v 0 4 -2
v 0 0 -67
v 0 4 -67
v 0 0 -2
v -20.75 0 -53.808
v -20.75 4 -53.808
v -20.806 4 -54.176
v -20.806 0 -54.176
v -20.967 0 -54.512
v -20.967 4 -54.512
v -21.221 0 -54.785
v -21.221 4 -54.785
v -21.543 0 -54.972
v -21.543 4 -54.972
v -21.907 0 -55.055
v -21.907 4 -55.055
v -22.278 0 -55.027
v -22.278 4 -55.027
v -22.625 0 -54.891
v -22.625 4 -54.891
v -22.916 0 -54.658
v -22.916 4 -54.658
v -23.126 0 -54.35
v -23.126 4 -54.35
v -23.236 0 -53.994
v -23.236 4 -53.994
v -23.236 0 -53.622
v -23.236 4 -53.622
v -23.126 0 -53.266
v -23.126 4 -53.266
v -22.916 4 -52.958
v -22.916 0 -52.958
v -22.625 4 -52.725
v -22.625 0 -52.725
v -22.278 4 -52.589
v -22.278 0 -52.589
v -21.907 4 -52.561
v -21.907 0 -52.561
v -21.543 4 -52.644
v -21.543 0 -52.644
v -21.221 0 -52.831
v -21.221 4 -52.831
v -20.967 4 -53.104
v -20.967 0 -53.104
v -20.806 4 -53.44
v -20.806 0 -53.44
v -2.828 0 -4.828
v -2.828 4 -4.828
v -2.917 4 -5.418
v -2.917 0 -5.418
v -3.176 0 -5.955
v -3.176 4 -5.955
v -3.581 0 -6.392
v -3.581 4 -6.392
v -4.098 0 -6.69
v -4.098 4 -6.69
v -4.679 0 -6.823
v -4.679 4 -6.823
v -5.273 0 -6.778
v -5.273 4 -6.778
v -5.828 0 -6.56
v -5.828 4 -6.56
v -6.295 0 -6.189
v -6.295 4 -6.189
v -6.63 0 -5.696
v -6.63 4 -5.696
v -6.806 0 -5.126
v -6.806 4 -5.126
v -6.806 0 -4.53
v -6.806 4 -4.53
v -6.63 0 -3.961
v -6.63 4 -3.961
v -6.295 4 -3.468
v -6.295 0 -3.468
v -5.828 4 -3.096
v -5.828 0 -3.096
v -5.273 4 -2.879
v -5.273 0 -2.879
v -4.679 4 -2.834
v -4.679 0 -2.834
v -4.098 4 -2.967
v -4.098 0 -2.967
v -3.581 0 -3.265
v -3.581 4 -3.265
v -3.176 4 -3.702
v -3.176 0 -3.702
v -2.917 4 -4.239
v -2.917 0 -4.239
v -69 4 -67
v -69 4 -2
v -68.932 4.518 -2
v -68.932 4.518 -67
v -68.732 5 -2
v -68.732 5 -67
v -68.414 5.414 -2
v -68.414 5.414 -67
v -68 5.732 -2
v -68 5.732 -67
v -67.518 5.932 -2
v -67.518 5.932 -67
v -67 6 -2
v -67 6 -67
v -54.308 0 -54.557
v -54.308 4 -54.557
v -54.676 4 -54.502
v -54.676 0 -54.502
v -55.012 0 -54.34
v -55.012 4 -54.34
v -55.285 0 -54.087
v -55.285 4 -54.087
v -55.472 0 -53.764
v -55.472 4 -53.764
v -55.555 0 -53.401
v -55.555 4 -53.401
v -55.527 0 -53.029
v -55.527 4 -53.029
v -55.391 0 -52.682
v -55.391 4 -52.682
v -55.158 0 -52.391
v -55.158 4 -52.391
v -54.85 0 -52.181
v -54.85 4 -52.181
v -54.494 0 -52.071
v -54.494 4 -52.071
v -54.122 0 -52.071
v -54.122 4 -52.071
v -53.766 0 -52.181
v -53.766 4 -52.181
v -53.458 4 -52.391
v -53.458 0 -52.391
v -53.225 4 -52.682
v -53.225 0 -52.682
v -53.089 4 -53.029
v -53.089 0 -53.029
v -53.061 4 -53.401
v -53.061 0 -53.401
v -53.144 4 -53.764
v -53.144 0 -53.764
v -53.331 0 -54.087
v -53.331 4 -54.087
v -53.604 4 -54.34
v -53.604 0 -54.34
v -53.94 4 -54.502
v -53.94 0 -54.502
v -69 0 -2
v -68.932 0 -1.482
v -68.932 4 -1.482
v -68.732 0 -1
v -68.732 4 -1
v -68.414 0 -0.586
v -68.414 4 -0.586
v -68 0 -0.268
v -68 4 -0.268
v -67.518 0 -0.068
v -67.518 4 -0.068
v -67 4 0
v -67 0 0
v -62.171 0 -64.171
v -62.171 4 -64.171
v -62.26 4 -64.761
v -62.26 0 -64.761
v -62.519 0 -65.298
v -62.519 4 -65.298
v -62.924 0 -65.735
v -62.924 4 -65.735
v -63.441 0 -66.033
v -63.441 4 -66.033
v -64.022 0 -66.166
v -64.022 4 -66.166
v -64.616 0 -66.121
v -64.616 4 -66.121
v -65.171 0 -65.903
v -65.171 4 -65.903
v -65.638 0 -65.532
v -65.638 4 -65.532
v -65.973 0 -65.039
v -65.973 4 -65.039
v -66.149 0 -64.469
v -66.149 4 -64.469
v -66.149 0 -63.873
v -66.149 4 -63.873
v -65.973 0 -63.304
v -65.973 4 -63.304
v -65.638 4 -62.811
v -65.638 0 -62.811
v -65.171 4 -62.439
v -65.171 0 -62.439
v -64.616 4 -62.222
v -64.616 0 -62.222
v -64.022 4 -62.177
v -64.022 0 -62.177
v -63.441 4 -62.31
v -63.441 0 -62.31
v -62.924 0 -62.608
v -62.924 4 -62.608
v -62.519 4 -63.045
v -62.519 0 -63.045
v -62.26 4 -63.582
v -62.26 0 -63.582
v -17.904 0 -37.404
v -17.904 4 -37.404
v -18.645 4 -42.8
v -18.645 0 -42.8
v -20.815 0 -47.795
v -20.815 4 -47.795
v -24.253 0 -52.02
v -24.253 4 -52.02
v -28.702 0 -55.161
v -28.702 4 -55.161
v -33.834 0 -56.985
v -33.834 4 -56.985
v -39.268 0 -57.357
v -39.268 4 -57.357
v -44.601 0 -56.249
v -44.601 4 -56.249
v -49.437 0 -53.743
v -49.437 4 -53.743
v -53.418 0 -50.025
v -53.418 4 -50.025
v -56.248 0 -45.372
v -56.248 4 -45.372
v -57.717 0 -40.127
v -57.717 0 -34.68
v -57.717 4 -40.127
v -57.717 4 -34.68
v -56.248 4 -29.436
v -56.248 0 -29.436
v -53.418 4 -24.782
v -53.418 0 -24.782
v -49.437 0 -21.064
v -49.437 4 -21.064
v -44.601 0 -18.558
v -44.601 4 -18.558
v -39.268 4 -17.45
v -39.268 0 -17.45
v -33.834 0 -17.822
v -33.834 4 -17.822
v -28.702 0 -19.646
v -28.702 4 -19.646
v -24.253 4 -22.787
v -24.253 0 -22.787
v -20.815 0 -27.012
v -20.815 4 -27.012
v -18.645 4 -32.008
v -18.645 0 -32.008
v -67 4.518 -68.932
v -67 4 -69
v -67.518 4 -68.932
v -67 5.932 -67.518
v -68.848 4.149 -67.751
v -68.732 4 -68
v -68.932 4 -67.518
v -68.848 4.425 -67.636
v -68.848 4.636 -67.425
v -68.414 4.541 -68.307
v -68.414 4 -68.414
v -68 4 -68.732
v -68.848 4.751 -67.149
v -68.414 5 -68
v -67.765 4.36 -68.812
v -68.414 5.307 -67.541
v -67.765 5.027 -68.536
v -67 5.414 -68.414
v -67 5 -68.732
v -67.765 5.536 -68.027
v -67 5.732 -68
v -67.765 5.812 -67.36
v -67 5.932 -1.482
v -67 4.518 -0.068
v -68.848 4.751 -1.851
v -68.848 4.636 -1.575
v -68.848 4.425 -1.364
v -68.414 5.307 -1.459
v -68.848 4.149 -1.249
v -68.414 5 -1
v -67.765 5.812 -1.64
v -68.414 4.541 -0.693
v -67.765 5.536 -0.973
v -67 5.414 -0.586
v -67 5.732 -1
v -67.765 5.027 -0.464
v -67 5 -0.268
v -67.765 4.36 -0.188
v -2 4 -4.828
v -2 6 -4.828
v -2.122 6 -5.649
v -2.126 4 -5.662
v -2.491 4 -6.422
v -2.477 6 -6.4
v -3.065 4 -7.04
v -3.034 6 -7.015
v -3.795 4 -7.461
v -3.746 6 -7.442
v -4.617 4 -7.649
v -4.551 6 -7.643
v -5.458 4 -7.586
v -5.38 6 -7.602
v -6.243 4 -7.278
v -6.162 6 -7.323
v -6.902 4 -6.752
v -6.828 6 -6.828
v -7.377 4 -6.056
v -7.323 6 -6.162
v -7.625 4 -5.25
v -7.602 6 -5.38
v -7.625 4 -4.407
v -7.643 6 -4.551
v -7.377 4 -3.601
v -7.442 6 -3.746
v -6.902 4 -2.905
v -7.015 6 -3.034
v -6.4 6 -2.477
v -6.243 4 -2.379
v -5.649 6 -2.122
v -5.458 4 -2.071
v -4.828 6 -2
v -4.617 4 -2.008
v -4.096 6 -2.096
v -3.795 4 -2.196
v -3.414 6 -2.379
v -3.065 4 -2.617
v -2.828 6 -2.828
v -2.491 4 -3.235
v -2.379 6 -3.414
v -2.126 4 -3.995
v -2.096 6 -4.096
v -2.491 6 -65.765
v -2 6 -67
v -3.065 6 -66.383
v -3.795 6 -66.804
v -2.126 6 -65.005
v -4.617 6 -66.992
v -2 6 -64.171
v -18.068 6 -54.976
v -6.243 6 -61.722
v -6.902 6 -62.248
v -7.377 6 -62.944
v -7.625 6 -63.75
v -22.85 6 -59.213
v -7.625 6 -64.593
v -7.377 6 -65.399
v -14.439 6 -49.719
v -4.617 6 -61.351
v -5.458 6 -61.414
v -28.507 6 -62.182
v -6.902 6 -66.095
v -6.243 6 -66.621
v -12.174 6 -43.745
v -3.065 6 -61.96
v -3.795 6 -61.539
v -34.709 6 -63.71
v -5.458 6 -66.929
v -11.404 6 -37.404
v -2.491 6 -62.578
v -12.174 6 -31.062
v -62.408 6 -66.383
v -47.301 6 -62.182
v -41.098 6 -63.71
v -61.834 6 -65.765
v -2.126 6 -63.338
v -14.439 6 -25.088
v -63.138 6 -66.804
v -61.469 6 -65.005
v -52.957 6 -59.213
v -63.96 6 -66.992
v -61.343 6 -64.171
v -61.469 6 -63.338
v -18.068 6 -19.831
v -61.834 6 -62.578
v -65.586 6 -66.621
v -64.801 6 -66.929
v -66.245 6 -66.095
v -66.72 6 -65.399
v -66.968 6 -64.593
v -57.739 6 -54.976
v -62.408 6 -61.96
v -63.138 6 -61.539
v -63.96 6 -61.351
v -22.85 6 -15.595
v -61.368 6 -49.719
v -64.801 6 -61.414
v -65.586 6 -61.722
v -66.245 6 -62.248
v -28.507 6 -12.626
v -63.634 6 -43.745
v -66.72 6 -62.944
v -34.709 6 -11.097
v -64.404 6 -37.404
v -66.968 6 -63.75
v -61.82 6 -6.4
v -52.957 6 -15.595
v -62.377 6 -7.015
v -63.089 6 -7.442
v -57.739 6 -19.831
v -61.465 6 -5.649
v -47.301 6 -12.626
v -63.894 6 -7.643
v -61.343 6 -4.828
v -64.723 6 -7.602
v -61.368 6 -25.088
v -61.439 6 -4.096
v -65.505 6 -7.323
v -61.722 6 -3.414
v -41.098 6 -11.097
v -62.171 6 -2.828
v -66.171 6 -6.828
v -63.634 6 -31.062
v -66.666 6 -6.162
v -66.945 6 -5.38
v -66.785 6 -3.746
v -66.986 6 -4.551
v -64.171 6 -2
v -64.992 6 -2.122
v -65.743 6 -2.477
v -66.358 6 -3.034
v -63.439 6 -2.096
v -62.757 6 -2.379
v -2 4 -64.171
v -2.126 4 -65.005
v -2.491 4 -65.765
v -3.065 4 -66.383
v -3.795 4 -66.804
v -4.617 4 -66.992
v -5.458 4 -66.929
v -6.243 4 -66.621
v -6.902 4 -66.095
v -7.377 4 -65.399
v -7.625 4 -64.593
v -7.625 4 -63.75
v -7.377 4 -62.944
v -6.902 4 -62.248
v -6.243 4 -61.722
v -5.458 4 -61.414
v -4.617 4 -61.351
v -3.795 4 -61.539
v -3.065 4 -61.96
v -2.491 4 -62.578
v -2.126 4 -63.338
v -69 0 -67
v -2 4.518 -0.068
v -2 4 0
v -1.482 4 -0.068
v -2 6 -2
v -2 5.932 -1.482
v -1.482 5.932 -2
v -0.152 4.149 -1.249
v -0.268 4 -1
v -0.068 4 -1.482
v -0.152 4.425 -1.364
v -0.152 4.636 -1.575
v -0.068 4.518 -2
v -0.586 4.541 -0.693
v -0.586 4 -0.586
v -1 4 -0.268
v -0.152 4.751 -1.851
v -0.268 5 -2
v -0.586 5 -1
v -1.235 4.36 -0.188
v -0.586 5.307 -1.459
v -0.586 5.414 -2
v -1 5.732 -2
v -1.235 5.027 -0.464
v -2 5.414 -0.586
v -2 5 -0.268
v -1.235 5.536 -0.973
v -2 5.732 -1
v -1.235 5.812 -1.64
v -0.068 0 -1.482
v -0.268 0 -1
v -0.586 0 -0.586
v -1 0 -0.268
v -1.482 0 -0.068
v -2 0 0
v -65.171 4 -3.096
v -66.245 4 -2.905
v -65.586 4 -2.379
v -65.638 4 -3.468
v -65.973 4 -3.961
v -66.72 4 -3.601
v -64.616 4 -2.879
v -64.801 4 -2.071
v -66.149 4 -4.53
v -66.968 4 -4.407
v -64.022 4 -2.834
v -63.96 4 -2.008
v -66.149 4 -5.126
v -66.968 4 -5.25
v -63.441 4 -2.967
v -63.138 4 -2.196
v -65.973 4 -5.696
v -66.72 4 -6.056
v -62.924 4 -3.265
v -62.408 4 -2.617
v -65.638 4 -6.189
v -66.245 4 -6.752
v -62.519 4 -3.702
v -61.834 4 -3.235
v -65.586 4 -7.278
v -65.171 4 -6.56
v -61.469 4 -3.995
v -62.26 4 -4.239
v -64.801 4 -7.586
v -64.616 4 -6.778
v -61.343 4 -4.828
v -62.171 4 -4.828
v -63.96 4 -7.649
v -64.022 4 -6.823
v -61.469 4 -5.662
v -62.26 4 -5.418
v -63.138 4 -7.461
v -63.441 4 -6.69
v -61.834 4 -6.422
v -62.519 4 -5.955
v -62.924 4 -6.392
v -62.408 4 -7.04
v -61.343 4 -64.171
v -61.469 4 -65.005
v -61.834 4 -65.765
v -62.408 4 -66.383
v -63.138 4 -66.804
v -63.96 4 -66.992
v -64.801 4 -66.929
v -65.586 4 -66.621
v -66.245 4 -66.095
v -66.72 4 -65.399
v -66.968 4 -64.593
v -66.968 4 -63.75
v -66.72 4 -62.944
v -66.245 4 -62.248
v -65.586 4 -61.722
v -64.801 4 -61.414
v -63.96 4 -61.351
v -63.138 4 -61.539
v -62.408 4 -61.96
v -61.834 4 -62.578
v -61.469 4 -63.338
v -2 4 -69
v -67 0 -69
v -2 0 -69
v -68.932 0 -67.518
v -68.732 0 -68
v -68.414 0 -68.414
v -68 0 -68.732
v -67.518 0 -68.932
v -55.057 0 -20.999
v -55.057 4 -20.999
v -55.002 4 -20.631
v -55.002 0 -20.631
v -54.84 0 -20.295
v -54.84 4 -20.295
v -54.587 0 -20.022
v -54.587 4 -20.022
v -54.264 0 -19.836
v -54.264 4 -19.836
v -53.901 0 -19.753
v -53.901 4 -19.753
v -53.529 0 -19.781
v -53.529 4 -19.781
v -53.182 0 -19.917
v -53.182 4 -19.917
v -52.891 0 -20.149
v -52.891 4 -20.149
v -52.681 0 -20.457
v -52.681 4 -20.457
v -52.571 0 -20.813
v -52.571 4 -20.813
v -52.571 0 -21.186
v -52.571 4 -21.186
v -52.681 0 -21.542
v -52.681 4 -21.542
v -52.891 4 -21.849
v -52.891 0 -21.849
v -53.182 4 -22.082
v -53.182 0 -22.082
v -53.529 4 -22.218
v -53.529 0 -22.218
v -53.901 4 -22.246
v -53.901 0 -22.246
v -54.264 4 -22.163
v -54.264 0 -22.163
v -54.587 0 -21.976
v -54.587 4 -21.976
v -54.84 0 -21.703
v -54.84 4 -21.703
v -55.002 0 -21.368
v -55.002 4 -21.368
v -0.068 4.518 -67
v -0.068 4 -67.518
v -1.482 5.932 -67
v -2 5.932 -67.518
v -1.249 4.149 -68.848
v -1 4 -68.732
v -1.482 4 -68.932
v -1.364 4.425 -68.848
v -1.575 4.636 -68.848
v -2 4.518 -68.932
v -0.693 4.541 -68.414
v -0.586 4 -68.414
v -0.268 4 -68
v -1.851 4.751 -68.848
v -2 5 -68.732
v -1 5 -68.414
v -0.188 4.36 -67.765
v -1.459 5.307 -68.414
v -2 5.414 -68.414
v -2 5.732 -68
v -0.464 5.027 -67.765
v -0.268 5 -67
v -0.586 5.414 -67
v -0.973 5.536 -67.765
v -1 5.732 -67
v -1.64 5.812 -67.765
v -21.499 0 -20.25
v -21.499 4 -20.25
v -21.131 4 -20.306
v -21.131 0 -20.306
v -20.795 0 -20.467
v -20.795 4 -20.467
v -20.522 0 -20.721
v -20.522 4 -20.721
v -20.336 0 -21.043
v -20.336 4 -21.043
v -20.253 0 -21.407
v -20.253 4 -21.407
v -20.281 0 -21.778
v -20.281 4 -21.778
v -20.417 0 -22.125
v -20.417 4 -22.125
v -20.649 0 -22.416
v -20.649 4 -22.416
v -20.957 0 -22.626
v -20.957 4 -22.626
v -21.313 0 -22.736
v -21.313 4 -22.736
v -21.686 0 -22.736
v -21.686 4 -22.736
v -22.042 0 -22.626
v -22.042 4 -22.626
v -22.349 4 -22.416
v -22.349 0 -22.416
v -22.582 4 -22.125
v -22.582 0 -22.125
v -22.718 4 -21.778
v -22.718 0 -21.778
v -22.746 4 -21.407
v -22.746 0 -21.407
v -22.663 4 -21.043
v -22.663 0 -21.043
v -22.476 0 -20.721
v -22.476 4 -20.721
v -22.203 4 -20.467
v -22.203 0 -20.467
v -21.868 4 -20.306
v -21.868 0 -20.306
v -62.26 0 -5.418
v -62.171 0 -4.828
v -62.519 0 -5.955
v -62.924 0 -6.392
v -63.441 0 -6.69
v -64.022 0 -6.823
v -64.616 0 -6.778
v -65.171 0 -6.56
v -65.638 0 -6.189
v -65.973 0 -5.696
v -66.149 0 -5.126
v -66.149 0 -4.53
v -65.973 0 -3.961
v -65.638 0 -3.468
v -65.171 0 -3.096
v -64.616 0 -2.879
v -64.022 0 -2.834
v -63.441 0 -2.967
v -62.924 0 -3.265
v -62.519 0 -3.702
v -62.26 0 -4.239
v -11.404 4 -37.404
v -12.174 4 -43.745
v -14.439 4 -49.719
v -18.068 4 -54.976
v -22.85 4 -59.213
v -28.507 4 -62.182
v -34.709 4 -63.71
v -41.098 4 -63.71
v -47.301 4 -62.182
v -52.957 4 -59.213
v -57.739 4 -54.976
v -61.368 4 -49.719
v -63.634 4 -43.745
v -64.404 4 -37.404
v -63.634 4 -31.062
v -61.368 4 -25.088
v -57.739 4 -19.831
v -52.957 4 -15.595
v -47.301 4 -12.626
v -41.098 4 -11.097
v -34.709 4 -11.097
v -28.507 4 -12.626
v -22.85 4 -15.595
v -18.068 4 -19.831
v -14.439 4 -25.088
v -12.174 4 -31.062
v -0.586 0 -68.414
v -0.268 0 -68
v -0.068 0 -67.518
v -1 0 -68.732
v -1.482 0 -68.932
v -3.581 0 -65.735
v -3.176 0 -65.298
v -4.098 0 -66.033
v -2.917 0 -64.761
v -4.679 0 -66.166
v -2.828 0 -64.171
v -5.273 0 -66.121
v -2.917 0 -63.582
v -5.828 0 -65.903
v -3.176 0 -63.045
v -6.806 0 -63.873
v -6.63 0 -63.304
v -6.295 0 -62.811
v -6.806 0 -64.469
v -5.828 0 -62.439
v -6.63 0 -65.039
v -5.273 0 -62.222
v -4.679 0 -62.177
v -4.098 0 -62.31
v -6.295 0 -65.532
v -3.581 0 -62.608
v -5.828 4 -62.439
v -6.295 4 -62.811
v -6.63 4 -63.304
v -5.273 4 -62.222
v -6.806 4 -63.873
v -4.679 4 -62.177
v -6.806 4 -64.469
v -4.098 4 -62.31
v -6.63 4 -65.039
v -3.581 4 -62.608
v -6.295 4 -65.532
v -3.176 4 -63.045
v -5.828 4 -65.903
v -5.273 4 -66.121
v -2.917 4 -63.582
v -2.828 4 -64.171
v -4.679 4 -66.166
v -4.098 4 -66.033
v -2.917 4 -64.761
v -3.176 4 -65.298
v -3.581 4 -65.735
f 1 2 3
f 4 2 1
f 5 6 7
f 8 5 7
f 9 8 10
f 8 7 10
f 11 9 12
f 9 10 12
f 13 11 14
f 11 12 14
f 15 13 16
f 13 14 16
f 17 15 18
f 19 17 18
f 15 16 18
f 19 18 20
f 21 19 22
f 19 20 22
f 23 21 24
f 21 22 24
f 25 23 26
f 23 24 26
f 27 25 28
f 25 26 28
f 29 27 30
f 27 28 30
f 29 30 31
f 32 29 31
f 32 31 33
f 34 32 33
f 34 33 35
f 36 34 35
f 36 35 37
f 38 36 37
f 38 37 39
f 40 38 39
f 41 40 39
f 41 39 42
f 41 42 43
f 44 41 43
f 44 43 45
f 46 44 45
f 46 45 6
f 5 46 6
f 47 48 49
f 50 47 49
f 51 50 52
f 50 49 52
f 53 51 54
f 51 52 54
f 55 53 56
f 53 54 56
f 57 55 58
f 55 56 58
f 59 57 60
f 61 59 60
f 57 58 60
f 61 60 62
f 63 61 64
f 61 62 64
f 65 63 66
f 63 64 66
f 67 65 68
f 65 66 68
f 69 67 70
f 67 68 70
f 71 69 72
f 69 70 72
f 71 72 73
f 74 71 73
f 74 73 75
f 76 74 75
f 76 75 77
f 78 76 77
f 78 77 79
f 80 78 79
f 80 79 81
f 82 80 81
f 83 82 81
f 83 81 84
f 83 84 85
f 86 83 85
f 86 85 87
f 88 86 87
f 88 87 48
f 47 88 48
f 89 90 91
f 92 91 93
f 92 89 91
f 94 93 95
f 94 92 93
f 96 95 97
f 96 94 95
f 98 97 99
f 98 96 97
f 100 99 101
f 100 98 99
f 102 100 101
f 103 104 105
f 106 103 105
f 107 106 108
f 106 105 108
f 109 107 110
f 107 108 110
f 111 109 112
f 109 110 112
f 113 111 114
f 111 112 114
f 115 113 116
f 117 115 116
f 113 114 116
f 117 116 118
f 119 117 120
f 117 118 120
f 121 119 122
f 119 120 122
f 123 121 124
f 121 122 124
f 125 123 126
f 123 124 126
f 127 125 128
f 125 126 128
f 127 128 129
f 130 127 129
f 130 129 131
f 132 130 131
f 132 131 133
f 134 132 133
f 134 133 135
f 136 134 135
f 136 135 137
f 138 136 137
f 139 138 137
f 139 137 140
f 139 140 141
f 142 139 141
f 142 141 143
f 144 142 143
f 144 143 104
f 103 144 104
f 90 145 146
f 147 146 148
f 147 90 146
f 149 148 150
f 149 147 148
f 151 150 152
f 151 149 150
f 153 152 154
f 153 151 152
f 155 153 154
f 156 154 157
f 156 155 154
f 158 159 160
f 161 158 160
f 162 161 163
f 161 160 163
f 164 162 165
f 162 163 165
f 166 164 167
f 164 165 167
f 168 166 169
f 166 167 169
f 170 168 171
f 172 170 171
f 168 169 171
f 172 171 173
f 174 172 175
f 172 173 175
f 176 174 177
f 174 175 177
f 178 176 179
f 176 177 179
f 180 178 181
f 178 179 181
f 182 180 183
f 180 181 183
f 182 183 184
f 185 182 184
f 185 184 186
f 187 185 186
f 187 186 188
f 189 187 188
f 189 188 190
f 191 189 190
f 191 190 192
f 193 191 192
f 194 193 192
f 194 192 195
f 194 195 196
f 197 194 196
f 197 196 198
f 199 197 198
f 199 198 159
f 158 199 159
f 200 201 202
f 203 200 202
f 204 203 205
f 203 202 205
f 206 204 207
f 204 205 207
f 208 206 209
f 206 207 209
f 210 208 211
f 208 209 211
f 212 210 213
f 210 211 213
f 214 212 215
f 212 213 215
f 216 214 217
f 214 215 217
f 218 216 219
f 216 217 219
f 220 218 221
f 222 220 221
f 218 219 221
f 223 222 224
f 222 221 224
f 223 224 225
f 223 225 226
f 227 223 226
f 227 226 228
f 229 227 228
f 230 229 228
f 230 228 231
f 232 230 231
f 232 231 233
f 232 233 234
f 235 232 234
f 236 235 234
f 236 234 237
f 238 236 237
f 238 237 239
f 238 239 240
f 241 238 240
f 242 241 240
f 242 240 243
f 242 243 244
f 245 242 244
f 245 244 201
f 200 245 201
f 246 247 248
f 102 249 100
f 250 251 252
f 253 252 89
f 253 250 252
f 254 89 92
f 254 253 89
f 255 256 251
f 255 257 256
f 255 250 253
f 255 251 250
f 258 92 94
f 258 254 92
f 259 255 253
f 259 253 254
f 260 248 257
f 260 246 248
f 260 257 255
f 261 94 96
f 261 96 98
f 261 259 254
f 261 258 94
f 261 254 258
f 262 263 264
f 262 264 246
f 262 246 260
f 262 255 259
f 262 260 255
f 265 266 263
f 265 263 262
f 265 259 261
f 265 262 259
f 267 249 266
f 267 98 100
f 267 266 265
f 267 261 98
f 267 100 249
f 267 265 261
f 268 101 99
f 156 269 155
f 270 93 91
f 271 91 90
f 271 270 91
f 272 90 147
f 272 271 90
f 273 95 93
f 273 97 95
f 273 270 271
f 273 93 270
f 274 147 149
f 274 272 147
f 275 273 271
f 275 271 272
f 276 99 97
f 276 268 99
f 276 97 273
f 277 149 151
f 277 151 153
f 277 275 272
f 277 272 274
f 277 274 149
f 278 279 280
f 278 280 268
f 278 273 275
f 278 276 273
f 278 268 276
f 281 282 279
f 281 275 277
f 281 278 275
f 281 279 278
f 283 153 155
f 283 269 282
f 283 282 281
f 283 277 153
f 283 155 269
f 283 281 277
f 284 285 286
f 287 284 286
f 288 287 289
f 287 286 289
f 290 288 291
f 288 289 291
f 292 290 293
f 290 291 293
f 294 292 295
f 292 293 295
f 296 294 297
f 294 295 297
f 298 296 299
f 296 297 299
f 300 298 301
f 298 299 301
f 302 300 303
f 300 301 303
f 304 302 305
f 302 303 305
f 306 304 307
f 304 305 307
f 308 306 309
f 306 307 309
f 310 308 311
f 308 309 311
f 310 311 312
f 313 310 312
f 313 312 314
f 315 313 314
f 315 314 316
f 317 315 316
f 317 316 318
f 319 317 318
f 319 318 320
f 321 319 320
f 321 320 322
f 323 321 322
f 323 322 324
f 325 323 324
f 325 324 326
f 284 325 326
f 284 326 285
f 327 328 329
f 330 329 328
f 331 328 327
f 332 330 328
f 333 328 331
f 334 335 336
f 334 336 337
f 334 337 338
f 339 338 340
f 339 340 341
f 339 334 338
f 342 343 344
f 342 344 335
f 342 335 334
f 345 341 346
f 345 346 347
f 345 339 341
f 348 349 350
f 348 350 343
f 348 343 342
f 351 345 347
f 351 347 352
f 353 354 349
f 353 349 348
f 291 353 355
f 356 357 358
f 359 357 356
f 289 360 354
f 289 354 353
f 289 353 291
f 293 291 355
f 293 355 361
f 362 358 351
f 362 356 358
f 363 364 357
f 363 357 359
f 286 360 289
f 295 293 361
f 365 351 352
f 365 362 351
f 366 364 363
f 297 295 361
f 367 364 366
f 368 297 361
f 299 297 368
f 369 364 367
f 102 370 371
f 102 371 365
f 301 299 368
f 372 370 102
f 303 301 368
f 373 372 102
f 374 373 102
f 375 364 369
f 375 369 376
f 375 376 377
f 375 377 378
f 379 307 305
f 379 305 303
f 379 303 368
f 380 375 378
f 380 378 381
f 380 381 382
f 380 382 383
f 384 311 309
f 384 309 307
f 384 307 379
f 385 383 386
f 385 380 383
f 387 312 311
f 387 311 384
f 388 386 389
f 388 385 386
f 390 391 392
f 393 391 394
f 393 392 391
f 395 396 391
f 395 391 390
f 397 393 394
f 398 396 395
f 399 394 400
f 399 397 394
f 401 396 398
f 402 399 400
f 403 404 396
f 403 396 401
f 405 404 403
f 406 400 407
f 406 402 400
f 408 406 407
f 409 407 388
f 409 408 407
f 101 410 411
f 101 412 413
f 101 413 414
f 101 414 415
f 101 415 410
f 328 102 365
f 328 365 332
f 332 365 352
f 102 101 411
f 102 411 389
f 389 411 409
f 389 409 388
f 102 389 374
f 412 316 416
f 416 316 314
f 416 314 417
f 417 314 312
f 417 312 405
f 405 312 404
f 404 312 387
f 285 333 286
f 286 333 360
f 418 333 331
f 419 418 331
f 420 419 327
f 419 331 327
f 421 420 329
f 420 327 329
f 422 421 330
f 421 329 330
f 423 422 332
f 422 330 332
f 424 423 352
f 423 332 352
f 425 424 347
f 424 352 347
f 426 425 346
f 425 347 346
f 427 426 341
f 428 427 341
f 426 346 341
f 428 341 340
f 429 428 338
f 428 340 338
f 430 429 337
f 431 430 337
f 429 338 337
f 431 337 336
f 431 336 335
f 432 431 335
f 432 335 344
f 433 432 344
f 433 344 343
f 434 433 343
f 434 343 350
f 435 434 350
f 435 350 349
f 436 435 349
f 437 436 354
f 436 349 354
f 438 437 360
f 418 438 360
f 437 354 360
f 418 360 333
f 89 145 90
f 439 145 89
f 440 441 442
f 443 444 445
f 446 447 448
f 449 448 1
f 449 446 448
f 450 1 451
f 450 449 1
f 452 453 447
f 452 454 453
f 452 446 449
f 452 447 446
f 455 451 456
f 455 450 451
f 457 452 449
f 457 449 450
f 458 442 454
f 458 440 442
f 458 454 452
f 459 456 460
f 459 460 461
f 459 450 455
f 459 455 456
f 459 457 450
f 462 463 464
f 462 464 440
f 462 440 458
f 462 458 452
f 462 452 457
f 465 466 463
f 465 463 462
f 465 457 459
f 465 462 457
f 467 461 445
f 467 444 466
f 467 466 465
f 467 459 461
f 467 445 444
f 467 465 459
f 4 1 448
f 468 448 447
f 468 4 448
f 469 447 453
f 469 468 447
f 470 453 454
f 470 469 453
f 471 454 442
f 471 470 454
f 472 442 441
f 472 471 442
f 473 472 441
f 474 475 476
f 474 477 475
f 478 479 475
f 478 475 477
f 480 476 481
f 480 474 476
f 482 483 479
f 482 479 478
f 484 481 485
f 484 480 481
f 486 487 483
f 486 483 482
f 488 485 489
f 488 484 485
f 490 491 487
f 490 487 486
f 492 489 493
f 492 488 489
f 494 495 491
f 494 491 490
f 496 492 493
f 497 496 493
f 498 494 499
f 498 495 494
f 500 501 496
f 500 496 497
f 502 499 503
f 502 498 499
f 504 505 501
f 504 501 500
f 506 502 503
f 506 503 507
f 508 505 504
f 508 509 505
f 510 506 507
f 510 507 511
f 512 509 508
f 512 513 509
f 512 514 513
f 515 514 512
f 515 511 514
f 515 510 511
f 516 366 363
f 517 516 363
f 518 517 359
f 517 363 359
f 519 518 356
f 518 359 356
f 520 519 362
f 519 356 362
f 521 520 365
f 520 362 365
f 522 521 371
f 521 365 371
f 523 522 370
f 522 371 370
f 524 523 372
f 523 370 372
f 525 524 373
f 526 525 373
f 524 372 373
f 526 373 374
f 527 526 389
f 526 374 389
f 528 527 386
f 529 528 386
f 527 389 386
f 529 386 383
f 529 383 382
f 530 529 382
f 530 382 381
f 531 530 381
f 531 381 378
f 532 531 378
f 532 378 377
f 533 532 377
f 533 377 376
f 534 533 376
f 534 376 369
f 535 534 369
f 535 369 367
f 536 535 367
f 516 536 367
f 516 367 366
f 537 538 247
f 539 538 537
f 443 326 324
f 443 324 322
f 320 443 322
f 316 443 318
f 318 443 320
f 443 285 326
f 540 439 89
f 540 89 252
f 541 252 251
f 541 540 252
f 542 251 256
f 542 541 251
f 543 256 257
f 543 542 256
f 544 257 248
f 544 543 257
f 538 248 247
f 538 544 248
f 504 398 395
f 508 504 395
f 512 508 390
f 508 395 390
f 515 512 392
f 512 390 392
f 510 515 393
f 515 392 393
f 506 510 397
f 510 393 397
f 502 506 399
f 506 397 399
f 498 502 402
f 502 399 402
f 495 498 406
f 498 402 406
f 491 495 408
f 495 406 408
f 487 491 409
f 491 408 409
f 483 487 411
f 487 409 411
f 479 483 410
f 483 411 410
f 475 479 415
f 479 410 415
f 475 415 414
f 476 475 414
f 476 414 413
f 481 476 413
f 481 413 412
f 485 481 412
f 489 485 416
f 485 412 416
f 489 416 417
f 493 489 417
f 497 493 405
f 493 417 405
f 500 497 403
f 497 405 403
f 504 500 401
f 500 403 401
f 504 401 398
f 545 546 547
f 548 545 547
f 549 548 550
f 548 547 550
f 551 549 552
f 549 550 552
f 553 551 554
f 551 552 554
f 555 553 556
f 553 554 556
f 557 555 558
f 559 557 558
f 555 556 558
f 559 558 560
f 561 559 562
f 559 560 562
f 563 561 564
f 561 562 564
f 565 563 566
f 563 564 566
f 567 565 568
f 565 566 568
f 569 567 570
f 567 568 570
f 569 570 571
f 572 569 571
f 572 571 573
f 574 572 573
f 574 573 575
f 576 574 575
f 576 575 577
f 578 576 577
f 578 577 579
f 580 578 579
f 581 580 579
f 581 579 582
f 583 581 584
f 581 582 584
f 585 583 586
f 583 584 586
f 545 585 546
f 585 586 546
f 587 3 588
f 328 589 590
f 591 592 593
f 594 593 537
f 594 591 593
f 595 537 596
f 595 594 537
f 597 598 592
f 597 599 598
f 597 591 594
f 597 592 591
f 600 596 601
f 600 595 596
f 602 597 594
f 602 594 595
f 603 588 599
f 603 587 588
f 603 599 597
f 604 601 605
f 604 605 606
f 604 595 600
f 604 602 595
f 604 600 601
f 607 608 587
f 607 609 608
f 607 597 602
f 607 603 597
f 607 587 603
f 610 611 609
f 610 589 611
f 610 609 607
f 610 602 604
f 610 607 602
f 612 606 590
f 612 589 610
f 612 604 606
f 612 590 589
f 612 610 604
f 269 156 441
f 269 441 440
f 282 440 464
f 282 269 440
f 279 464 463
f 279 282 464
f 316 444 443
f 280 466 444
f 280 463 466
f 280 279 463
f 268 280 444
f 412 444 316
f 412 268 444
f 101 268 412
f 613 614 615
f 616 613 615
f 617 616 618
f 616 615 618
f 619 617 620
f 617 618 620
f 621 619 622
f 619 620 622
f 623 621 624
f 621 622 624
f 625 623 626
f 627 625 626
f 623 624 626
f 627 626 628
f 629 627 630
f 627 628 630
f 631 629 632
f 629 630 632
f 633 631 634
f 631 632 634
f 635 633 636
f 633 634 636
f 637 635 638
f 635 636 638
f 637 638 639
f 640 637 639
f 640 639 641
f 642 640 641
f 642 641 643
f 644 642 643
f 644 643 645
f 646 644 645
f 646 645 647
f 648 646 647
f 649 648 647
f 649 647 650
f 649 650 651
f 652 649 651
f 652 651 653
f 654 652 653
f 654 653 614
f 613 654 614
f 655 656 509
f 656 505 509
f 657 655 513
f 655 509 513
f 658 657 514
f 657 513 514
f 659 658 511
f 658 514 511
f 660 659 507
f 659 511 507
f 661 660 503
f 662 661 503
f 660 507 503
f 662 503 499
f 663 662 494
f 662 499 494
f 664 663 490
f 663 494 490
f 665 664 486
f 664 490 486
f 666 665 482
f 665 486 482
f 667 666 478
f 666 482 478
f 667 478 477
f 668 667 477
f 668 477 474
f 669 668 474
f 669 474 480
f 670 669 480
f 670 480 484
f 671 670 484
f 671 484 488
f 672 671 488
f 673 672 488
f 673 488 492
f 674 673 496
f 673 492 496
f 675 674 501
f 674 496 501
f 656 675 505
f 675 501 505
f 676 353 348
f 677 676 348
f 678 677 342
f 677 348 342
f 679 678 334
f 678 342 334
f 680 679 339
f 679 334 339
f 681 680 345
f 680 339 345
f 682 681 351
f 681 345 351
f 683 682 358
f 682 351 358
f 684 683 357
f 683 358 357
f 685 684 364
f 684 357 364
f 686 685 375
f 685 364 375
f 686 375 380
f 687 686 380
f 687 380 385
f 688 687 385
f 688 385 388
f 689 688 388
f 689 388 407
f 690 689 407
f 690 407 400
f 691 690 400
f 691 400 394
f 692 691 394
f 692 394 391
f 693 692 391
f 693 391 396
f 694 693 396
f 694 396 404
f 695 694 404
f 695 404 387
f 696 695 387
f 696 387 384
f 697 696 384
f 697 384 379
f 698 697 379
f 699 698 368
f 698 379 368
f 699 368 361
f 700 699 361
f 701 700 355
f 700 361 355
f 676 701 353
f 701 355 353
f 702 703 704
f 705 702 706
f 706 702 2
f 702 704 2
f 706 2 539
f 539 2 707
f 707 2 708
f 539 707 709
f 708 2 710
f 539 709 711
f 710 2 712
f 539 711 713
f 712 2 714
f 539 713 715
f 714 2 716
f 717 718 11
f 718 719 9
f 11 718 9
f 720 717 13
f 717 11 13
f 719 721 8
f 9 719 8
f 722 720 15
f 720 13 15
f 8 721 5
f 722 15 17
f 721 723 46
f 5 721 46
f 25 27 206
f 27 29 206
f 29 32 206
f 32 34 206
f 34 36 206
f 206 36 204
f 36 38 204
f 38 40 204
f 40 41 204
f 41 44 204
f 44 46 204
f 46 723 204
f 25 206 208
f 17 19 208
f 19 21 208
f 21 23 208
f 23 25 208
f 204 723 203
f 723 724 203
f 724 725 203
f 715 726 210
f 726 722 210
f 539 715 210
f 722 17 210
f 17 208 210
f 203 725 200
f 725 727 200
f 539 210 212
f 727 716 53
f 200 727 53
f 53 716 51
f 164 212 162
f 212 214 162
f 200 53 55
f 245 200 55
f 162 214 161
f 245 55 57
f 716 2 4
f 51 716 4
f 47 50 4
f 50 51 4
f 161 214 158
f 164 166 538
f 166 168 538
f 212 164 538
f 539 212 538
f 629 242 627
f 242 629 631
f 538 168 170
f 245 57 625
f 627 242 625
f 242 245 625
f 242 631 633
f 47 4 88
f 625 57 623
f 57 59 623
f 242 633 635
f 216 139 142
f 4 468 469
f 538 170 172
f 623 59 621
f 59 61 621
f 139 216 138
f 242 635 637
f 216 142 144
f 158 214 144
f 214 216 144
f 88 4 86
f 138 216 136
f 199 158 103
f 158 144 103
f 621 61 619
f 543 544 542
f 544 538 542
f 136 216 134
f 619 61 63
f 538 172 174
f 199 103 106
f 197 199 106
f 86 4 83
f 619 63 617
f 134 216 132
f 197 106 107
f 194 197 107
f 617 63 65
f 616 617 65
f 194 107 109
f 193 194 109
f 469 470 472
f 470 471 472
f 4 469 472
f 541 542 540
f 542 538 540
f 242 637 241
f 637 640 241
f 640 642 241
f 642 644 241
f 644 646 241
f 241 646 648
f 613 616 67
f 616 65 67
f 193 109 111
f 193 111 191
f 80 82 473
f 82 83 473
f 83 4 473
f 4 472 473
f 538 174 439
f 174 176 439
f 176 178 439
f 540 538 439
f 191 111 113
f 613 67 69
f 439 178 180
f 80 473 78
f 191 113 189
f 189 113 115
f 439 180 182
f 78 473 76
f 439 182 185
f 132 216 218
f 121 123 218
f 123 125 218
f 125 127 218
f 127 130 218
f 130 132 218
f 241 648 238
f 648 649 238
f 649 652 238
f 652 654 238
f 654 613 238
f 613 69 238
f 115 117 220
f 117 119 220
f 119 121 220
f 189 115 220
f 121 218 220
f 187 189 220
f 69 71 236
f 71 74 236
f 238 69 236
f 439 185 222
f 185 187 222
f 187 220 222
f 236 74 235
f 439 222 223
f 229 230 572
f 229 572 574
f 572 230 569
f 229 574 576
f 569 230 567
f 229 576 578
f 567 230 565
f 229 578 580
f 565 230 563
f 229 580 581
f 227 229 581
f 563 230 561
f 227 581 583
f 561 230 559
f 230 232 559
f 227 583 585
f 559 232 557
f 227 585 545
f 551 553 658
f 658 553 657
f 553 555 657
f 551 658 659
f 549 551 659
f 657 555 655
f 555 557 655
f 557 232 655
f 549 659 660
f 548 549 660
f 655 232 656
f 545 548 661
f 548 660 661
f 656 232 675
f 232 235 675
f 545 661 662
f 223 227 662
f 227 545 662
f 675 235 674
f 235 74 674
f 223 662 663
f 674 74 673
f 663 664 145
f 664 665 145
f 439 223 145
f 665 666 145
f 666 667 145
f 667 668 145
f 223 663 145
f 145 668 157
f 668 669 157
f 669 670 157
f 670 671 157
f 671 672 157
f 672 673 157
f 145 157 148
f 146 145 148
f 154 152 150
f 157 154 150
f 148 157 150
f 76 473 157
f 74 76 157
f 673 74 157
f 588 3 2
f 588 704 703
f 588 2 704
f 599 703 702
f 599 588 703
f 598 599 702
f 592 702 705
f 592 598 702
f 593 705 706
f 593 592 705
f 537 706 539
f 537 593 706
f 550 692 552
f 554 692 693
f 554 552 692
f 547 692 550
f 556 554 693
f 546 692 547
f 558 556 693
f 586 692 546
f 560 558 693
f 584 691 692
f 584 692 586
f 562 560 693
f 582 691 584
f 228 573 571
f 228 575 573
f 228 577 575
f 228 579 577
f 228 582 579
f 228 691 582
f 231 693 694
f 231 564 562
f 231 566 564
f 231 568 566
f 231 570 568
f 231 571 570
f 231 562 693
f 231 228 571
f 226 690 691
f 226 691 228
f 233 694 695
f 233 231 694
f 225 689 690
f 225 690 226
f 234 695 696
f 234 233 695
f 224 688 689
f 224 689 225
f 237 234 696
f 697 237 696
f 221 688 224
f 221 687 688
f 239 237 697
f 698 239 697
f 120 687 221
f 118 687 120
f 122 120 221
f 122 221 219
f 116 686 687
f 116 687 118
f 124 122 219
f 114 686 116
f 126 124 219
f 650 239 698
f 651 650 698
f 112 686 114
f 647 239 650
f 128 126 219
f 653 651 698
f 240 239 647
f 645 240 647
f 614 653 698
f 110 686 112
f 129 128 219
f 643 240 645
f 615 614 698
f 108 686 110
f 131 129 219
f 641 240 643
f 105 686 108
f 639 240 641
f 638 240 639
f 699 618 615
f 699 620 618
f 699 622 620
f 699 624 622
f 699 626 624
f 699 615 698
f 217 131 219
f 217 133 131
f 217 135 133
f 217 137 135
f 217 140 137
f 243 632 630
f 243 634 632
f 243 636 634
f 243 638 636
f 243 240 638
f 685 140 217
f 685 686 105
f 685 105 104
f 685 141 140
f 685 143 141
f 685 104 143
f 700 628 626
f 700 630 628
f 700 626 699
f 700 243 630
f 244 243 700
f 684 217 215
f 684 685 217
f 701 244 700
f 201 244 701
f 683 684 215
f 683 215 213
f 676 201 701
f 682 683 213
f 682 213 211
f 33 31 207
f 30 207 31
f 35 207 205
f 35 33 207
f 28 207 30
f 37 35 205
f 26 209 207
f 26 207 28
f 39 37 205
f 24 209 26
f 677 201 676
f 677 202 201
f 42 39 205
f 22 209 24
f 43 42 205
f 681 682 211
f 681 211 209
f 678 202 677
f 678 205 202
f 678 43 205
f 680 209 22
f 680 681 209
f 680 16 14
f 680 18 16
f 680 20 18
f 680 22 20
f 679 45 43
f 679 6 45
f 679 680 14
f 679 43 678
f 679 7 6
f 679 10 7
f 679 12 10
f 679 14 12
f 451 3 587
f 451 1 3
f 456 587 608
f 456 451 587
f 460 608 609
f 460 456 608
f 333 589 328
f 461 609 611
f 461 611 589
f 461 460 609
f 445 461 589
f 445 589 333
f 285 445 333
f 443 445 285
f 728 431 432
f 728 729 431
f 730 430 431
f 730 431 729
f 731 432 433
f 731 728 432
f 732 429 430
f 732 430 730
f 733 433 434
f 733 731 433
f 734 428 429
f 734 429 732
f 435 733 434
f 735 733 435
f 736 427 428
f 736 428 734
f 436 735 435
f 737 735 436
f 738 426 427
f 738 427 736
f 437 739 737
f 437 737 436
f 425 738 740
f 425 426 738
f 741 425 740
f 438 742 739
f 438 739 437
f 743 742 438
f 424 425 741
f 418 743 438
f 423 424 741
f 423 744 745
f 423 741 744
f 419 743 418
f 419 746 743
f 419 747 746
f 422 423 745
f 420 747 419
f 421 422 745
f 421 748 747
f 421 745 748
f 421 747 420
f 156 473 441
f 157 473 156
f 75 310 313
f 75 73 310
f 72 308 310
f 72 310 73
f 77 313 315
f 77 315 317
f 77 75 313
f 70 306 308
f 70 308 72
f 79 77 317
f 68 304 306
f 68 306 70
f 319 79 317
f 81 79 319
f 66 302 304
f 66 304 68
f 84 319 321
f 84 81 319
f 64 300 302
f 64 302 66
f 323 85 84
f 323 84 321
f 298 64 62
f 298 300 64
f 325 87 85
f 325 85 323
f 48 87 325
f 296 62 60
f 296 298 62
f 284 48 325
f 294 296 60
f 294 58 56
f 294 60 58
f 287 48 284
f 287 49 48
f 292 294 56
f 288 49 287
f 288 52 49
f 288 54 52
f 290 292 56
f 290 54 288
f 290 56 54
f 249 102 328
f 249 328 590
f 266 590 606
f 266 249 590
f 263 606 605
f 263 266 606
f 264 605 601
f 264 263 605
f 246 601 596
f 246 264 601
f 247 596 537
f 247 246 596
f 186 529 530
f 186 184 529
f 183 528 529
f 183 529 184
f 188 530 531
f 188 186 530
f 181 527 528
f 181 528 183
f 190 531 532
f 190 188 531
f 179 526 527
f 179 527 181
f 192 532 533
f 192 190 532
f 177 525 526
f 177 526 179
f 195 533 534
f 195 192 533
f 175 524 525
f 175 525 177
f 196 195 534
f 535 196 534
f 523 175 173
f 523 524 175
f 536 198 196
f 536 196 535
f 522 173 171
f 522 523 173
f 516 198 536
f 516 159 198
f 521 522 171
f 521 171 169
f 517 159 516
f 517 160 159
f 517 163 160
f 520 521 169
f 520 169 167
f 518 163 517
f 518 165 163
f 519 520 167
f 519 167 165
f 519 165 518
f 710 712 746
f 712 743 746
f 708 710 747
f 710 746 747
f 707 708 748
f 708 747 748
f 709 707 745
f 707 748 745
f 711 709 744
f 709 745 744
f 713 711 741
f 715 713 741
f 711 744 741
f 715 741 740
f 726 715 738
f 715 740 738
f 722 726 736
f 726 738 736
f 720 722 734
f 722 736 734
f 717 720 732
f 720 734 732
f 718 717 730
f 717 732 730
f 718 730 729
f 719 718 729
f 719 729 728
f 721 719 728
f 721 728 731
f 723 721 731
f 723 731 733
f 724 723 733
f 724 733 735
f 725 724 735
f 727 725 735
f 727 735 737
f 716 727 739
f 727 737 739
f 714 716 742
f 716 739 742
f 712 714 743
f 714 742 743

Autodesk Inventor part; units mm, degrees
ref_plane "YZ Plane" through (0, 0, 0) normal (1, 0, 0) x (0, 1, 0)
ref_plane "XZ Plane" through (0, 0, 0) normal (0, 1, 0) x (-1, 0, 0)
ref_plane "XY Plane" through (0, 0, 0) normal (0, 0, 1) x (1, 0, 0)
sketch "Sketch1" plane through (0, 0, 0) normal (0, 1, 0) x (-1, 0, 0)
  line L0 (0, 0) -> (69, 0)
  line L1 (69, 0) -> (69, -69)
  line L2 (69, -69) -> (0, -69)
  line L3 (0, -69) -> (0, 0)
  dimension "d0" = 69
  dimension "d1" = 69
extrude "Extrusion1" add sketch "Sketch1" along normal blind 6
sketch "Sketch2" plane through (0, 6, 0) normal (0, 1, 0) x (1, 0, 0)
  line L0 (0, 0) -> (0, 69) construction
  line L1 (0, 69) -> (-69, 69) construction
  line L2 (0, 0) -> (-69, 69) construction
  line L3 (-69, 69) -> (-69, 0) construction
  line L4 (-69.6585, 0.6585) -> (-0.6585, 69.6585) construction
  circle A0 centre (-37.9036, 37.4036) radius 20
  line L5 (-61.9507, 69) -> (-61.9507, 54) construction
  line L6 (-37.9036, 17.4036) -> (-58.9036, 17.4036) construction
  line L7 (-58.9036, 17.4036) -> (-17.4036, 17.4036) construction
  line L8 (-58.4036, 17.4036) -> (-58.4036, 58.5866) construction
  line L9 (-58.4036, 58.5866) -> (-17.4036, 58.5866) construction
  line L10 (-17.4036, 58.5866) -> (-17.4036, 17.4036) construction
  line L11 (-69, 69) -> (-69, 0) construction
  line L12 (-69, 54) -> (-54, 54) construction
  line L13 (-69, 69) -> (-37.9036, 37.9036)
  dimension "d4" = 40
  dimension "d55" = 15
  dimension "d65" = 43.977
extrude "Extrusion2" cut sketch "Sketch2" against normal blind 6
fillet "Fillet1" radius 2 1 edges at (-34.5, 6, 0)
fillet "Fillet2" radius 2 3 edges at (0, 6, -35.5) (0, 5.4142, -0.5858) (0, 2, 0)
fillet "Fillet3" radius 2 3 edges at (-0.5858, 5.4142, -69) (0, 2, -69) (-35.5, 6, -69)
fillet "Fillet4" radius 2 5 edges at (-69, 5.4142, -0.5858) (-69, 2, 0) (-69, 5.4142, -68.4142) (-69, 2, -69) (-69, 6, -34.5)
sketch "Sketch3" plane through (0, 6, 0) normal (0, 1, 0) x (1, 0, 0)
  line L0 (-67, 69) -> (-67, 67) construction
  line L1 (-2, 2) -> (-67, 2) construction
  line L2 (-67, 67) -> (-2, 67) construction
  line L3 (-67, 2) -> (-67, 67) construction
  circle A0 centre (-22, 53.808) radius 1.25
  line L4 (-69, 67) -> (-69, 2) construction
  circle A1 centre (-37.9036, 37.4036) radius 20 construction
  line L5 (-17.9036, 37.4036) -> (-17.9036, 58.4036) construction
  line L6 (-22, 53.808) -> (-54, 53.808) construction
  line L7 (-22, 21.808) -> (-54, 21.808) construction
  line L8 (-54, 21.808) -> (-54, 53.808) construction
  line L9 (-22, 53.808) -> (-22, 21.808) construction
  line L10 (-22, 53.808) -> (-54, 21.808) construction
  line L11 (-69, 59.0495) -> (-54, 59.0495) construction
  line L12 (-54, 69) -> (-54, 53.808) construction
  point P0 (0, 0)
  dimension "d14" = 2.5
  dimension "d63" = 32
  dimension "d64" = 15
extrude "Extrusion3" cut sketch "Sketch3" against normal blind 10
pattern_circular "Circular Pattern1" count 4 over 360 about axis through (-37.9036, 6, -37.4036) along (0, -1, 0) of "Extrusion3"
sketch "Sketch6" plane through (0, 6, 0) normal (0, 1, 0) x (1, 0, 0)
  line L0 (-2, 67) -> (-2, 2) projected
  arc A0 (-2, 0) -> (0, 2) centre (-2, 2) ccw projected
  line L1 (0, 2) -> (-2, 2) projected
  line L2 (0, 0) -> (-2, 2)
  line L3 (-0.5858, 0.5858) -> (-4.8284, 4.8284) construction
  circle A1 centre (-4.8284, 4.8284) radius 2
  dimension "d52" = 6
  dimension "d53" = 4
extrude "Extrusion5" cut sketch "Sketch6" against normal blind 18.75 contours A1
pattern_linear "Rectangular Pattern1" count 2 spacing 59.343 along (0, 0, -1) count 2 spacing 59.343 along (-1, 0, 0) of "Extrusion5"
sketch "Sketch8" plane through (0, 6, 0) normal (0, 1, 0) x (1, 0, 0)
  line L0 (-2, 2) -> (-67, 2) projected
  circle A0 centre (-4.8284, 4.8284) radius 2 construction
  line L1 (-4.8284, 4.8284) -> (-2, 2) construction
  circle A1 centre (-4.8284, 4.8284) radius 2.8284 construction
  circle A2 centre (-4.8284, 4.8284) radius 2.8284
  circle A3 centre (-4.8284, 4.8284) radius 2
  point P0 (0, 0)
  point P1 (-4.1213, 4.1213)
extrude "Extrusion6" cut sketch "Sketch8" against normal blind 2 contours A2 | A3
pattern_linear "Rectangular Pattern2" count 2 spacing 59.343 along (-1, 0, 0) count 2 spacing 59.343 along (0, 0, -1) of "Extrusion6"
sketch "Sketch9" plane through (0, 6, 0) normal (0, 1, 0) x (1, 0, 0)
  circle A0 centre (-37.9036, 37.4036) radius 20 projected
  circle A1 centre (-37.9036, 37.4036) radius 26.5
  point P0 (0, 0)
  dimension "d59" = 53
extrude "Extrusion7" cut sketch "Sketch9" against normal blind 2
equation "\"d0\" = d1"
properties part number "joystickBOXtop"
